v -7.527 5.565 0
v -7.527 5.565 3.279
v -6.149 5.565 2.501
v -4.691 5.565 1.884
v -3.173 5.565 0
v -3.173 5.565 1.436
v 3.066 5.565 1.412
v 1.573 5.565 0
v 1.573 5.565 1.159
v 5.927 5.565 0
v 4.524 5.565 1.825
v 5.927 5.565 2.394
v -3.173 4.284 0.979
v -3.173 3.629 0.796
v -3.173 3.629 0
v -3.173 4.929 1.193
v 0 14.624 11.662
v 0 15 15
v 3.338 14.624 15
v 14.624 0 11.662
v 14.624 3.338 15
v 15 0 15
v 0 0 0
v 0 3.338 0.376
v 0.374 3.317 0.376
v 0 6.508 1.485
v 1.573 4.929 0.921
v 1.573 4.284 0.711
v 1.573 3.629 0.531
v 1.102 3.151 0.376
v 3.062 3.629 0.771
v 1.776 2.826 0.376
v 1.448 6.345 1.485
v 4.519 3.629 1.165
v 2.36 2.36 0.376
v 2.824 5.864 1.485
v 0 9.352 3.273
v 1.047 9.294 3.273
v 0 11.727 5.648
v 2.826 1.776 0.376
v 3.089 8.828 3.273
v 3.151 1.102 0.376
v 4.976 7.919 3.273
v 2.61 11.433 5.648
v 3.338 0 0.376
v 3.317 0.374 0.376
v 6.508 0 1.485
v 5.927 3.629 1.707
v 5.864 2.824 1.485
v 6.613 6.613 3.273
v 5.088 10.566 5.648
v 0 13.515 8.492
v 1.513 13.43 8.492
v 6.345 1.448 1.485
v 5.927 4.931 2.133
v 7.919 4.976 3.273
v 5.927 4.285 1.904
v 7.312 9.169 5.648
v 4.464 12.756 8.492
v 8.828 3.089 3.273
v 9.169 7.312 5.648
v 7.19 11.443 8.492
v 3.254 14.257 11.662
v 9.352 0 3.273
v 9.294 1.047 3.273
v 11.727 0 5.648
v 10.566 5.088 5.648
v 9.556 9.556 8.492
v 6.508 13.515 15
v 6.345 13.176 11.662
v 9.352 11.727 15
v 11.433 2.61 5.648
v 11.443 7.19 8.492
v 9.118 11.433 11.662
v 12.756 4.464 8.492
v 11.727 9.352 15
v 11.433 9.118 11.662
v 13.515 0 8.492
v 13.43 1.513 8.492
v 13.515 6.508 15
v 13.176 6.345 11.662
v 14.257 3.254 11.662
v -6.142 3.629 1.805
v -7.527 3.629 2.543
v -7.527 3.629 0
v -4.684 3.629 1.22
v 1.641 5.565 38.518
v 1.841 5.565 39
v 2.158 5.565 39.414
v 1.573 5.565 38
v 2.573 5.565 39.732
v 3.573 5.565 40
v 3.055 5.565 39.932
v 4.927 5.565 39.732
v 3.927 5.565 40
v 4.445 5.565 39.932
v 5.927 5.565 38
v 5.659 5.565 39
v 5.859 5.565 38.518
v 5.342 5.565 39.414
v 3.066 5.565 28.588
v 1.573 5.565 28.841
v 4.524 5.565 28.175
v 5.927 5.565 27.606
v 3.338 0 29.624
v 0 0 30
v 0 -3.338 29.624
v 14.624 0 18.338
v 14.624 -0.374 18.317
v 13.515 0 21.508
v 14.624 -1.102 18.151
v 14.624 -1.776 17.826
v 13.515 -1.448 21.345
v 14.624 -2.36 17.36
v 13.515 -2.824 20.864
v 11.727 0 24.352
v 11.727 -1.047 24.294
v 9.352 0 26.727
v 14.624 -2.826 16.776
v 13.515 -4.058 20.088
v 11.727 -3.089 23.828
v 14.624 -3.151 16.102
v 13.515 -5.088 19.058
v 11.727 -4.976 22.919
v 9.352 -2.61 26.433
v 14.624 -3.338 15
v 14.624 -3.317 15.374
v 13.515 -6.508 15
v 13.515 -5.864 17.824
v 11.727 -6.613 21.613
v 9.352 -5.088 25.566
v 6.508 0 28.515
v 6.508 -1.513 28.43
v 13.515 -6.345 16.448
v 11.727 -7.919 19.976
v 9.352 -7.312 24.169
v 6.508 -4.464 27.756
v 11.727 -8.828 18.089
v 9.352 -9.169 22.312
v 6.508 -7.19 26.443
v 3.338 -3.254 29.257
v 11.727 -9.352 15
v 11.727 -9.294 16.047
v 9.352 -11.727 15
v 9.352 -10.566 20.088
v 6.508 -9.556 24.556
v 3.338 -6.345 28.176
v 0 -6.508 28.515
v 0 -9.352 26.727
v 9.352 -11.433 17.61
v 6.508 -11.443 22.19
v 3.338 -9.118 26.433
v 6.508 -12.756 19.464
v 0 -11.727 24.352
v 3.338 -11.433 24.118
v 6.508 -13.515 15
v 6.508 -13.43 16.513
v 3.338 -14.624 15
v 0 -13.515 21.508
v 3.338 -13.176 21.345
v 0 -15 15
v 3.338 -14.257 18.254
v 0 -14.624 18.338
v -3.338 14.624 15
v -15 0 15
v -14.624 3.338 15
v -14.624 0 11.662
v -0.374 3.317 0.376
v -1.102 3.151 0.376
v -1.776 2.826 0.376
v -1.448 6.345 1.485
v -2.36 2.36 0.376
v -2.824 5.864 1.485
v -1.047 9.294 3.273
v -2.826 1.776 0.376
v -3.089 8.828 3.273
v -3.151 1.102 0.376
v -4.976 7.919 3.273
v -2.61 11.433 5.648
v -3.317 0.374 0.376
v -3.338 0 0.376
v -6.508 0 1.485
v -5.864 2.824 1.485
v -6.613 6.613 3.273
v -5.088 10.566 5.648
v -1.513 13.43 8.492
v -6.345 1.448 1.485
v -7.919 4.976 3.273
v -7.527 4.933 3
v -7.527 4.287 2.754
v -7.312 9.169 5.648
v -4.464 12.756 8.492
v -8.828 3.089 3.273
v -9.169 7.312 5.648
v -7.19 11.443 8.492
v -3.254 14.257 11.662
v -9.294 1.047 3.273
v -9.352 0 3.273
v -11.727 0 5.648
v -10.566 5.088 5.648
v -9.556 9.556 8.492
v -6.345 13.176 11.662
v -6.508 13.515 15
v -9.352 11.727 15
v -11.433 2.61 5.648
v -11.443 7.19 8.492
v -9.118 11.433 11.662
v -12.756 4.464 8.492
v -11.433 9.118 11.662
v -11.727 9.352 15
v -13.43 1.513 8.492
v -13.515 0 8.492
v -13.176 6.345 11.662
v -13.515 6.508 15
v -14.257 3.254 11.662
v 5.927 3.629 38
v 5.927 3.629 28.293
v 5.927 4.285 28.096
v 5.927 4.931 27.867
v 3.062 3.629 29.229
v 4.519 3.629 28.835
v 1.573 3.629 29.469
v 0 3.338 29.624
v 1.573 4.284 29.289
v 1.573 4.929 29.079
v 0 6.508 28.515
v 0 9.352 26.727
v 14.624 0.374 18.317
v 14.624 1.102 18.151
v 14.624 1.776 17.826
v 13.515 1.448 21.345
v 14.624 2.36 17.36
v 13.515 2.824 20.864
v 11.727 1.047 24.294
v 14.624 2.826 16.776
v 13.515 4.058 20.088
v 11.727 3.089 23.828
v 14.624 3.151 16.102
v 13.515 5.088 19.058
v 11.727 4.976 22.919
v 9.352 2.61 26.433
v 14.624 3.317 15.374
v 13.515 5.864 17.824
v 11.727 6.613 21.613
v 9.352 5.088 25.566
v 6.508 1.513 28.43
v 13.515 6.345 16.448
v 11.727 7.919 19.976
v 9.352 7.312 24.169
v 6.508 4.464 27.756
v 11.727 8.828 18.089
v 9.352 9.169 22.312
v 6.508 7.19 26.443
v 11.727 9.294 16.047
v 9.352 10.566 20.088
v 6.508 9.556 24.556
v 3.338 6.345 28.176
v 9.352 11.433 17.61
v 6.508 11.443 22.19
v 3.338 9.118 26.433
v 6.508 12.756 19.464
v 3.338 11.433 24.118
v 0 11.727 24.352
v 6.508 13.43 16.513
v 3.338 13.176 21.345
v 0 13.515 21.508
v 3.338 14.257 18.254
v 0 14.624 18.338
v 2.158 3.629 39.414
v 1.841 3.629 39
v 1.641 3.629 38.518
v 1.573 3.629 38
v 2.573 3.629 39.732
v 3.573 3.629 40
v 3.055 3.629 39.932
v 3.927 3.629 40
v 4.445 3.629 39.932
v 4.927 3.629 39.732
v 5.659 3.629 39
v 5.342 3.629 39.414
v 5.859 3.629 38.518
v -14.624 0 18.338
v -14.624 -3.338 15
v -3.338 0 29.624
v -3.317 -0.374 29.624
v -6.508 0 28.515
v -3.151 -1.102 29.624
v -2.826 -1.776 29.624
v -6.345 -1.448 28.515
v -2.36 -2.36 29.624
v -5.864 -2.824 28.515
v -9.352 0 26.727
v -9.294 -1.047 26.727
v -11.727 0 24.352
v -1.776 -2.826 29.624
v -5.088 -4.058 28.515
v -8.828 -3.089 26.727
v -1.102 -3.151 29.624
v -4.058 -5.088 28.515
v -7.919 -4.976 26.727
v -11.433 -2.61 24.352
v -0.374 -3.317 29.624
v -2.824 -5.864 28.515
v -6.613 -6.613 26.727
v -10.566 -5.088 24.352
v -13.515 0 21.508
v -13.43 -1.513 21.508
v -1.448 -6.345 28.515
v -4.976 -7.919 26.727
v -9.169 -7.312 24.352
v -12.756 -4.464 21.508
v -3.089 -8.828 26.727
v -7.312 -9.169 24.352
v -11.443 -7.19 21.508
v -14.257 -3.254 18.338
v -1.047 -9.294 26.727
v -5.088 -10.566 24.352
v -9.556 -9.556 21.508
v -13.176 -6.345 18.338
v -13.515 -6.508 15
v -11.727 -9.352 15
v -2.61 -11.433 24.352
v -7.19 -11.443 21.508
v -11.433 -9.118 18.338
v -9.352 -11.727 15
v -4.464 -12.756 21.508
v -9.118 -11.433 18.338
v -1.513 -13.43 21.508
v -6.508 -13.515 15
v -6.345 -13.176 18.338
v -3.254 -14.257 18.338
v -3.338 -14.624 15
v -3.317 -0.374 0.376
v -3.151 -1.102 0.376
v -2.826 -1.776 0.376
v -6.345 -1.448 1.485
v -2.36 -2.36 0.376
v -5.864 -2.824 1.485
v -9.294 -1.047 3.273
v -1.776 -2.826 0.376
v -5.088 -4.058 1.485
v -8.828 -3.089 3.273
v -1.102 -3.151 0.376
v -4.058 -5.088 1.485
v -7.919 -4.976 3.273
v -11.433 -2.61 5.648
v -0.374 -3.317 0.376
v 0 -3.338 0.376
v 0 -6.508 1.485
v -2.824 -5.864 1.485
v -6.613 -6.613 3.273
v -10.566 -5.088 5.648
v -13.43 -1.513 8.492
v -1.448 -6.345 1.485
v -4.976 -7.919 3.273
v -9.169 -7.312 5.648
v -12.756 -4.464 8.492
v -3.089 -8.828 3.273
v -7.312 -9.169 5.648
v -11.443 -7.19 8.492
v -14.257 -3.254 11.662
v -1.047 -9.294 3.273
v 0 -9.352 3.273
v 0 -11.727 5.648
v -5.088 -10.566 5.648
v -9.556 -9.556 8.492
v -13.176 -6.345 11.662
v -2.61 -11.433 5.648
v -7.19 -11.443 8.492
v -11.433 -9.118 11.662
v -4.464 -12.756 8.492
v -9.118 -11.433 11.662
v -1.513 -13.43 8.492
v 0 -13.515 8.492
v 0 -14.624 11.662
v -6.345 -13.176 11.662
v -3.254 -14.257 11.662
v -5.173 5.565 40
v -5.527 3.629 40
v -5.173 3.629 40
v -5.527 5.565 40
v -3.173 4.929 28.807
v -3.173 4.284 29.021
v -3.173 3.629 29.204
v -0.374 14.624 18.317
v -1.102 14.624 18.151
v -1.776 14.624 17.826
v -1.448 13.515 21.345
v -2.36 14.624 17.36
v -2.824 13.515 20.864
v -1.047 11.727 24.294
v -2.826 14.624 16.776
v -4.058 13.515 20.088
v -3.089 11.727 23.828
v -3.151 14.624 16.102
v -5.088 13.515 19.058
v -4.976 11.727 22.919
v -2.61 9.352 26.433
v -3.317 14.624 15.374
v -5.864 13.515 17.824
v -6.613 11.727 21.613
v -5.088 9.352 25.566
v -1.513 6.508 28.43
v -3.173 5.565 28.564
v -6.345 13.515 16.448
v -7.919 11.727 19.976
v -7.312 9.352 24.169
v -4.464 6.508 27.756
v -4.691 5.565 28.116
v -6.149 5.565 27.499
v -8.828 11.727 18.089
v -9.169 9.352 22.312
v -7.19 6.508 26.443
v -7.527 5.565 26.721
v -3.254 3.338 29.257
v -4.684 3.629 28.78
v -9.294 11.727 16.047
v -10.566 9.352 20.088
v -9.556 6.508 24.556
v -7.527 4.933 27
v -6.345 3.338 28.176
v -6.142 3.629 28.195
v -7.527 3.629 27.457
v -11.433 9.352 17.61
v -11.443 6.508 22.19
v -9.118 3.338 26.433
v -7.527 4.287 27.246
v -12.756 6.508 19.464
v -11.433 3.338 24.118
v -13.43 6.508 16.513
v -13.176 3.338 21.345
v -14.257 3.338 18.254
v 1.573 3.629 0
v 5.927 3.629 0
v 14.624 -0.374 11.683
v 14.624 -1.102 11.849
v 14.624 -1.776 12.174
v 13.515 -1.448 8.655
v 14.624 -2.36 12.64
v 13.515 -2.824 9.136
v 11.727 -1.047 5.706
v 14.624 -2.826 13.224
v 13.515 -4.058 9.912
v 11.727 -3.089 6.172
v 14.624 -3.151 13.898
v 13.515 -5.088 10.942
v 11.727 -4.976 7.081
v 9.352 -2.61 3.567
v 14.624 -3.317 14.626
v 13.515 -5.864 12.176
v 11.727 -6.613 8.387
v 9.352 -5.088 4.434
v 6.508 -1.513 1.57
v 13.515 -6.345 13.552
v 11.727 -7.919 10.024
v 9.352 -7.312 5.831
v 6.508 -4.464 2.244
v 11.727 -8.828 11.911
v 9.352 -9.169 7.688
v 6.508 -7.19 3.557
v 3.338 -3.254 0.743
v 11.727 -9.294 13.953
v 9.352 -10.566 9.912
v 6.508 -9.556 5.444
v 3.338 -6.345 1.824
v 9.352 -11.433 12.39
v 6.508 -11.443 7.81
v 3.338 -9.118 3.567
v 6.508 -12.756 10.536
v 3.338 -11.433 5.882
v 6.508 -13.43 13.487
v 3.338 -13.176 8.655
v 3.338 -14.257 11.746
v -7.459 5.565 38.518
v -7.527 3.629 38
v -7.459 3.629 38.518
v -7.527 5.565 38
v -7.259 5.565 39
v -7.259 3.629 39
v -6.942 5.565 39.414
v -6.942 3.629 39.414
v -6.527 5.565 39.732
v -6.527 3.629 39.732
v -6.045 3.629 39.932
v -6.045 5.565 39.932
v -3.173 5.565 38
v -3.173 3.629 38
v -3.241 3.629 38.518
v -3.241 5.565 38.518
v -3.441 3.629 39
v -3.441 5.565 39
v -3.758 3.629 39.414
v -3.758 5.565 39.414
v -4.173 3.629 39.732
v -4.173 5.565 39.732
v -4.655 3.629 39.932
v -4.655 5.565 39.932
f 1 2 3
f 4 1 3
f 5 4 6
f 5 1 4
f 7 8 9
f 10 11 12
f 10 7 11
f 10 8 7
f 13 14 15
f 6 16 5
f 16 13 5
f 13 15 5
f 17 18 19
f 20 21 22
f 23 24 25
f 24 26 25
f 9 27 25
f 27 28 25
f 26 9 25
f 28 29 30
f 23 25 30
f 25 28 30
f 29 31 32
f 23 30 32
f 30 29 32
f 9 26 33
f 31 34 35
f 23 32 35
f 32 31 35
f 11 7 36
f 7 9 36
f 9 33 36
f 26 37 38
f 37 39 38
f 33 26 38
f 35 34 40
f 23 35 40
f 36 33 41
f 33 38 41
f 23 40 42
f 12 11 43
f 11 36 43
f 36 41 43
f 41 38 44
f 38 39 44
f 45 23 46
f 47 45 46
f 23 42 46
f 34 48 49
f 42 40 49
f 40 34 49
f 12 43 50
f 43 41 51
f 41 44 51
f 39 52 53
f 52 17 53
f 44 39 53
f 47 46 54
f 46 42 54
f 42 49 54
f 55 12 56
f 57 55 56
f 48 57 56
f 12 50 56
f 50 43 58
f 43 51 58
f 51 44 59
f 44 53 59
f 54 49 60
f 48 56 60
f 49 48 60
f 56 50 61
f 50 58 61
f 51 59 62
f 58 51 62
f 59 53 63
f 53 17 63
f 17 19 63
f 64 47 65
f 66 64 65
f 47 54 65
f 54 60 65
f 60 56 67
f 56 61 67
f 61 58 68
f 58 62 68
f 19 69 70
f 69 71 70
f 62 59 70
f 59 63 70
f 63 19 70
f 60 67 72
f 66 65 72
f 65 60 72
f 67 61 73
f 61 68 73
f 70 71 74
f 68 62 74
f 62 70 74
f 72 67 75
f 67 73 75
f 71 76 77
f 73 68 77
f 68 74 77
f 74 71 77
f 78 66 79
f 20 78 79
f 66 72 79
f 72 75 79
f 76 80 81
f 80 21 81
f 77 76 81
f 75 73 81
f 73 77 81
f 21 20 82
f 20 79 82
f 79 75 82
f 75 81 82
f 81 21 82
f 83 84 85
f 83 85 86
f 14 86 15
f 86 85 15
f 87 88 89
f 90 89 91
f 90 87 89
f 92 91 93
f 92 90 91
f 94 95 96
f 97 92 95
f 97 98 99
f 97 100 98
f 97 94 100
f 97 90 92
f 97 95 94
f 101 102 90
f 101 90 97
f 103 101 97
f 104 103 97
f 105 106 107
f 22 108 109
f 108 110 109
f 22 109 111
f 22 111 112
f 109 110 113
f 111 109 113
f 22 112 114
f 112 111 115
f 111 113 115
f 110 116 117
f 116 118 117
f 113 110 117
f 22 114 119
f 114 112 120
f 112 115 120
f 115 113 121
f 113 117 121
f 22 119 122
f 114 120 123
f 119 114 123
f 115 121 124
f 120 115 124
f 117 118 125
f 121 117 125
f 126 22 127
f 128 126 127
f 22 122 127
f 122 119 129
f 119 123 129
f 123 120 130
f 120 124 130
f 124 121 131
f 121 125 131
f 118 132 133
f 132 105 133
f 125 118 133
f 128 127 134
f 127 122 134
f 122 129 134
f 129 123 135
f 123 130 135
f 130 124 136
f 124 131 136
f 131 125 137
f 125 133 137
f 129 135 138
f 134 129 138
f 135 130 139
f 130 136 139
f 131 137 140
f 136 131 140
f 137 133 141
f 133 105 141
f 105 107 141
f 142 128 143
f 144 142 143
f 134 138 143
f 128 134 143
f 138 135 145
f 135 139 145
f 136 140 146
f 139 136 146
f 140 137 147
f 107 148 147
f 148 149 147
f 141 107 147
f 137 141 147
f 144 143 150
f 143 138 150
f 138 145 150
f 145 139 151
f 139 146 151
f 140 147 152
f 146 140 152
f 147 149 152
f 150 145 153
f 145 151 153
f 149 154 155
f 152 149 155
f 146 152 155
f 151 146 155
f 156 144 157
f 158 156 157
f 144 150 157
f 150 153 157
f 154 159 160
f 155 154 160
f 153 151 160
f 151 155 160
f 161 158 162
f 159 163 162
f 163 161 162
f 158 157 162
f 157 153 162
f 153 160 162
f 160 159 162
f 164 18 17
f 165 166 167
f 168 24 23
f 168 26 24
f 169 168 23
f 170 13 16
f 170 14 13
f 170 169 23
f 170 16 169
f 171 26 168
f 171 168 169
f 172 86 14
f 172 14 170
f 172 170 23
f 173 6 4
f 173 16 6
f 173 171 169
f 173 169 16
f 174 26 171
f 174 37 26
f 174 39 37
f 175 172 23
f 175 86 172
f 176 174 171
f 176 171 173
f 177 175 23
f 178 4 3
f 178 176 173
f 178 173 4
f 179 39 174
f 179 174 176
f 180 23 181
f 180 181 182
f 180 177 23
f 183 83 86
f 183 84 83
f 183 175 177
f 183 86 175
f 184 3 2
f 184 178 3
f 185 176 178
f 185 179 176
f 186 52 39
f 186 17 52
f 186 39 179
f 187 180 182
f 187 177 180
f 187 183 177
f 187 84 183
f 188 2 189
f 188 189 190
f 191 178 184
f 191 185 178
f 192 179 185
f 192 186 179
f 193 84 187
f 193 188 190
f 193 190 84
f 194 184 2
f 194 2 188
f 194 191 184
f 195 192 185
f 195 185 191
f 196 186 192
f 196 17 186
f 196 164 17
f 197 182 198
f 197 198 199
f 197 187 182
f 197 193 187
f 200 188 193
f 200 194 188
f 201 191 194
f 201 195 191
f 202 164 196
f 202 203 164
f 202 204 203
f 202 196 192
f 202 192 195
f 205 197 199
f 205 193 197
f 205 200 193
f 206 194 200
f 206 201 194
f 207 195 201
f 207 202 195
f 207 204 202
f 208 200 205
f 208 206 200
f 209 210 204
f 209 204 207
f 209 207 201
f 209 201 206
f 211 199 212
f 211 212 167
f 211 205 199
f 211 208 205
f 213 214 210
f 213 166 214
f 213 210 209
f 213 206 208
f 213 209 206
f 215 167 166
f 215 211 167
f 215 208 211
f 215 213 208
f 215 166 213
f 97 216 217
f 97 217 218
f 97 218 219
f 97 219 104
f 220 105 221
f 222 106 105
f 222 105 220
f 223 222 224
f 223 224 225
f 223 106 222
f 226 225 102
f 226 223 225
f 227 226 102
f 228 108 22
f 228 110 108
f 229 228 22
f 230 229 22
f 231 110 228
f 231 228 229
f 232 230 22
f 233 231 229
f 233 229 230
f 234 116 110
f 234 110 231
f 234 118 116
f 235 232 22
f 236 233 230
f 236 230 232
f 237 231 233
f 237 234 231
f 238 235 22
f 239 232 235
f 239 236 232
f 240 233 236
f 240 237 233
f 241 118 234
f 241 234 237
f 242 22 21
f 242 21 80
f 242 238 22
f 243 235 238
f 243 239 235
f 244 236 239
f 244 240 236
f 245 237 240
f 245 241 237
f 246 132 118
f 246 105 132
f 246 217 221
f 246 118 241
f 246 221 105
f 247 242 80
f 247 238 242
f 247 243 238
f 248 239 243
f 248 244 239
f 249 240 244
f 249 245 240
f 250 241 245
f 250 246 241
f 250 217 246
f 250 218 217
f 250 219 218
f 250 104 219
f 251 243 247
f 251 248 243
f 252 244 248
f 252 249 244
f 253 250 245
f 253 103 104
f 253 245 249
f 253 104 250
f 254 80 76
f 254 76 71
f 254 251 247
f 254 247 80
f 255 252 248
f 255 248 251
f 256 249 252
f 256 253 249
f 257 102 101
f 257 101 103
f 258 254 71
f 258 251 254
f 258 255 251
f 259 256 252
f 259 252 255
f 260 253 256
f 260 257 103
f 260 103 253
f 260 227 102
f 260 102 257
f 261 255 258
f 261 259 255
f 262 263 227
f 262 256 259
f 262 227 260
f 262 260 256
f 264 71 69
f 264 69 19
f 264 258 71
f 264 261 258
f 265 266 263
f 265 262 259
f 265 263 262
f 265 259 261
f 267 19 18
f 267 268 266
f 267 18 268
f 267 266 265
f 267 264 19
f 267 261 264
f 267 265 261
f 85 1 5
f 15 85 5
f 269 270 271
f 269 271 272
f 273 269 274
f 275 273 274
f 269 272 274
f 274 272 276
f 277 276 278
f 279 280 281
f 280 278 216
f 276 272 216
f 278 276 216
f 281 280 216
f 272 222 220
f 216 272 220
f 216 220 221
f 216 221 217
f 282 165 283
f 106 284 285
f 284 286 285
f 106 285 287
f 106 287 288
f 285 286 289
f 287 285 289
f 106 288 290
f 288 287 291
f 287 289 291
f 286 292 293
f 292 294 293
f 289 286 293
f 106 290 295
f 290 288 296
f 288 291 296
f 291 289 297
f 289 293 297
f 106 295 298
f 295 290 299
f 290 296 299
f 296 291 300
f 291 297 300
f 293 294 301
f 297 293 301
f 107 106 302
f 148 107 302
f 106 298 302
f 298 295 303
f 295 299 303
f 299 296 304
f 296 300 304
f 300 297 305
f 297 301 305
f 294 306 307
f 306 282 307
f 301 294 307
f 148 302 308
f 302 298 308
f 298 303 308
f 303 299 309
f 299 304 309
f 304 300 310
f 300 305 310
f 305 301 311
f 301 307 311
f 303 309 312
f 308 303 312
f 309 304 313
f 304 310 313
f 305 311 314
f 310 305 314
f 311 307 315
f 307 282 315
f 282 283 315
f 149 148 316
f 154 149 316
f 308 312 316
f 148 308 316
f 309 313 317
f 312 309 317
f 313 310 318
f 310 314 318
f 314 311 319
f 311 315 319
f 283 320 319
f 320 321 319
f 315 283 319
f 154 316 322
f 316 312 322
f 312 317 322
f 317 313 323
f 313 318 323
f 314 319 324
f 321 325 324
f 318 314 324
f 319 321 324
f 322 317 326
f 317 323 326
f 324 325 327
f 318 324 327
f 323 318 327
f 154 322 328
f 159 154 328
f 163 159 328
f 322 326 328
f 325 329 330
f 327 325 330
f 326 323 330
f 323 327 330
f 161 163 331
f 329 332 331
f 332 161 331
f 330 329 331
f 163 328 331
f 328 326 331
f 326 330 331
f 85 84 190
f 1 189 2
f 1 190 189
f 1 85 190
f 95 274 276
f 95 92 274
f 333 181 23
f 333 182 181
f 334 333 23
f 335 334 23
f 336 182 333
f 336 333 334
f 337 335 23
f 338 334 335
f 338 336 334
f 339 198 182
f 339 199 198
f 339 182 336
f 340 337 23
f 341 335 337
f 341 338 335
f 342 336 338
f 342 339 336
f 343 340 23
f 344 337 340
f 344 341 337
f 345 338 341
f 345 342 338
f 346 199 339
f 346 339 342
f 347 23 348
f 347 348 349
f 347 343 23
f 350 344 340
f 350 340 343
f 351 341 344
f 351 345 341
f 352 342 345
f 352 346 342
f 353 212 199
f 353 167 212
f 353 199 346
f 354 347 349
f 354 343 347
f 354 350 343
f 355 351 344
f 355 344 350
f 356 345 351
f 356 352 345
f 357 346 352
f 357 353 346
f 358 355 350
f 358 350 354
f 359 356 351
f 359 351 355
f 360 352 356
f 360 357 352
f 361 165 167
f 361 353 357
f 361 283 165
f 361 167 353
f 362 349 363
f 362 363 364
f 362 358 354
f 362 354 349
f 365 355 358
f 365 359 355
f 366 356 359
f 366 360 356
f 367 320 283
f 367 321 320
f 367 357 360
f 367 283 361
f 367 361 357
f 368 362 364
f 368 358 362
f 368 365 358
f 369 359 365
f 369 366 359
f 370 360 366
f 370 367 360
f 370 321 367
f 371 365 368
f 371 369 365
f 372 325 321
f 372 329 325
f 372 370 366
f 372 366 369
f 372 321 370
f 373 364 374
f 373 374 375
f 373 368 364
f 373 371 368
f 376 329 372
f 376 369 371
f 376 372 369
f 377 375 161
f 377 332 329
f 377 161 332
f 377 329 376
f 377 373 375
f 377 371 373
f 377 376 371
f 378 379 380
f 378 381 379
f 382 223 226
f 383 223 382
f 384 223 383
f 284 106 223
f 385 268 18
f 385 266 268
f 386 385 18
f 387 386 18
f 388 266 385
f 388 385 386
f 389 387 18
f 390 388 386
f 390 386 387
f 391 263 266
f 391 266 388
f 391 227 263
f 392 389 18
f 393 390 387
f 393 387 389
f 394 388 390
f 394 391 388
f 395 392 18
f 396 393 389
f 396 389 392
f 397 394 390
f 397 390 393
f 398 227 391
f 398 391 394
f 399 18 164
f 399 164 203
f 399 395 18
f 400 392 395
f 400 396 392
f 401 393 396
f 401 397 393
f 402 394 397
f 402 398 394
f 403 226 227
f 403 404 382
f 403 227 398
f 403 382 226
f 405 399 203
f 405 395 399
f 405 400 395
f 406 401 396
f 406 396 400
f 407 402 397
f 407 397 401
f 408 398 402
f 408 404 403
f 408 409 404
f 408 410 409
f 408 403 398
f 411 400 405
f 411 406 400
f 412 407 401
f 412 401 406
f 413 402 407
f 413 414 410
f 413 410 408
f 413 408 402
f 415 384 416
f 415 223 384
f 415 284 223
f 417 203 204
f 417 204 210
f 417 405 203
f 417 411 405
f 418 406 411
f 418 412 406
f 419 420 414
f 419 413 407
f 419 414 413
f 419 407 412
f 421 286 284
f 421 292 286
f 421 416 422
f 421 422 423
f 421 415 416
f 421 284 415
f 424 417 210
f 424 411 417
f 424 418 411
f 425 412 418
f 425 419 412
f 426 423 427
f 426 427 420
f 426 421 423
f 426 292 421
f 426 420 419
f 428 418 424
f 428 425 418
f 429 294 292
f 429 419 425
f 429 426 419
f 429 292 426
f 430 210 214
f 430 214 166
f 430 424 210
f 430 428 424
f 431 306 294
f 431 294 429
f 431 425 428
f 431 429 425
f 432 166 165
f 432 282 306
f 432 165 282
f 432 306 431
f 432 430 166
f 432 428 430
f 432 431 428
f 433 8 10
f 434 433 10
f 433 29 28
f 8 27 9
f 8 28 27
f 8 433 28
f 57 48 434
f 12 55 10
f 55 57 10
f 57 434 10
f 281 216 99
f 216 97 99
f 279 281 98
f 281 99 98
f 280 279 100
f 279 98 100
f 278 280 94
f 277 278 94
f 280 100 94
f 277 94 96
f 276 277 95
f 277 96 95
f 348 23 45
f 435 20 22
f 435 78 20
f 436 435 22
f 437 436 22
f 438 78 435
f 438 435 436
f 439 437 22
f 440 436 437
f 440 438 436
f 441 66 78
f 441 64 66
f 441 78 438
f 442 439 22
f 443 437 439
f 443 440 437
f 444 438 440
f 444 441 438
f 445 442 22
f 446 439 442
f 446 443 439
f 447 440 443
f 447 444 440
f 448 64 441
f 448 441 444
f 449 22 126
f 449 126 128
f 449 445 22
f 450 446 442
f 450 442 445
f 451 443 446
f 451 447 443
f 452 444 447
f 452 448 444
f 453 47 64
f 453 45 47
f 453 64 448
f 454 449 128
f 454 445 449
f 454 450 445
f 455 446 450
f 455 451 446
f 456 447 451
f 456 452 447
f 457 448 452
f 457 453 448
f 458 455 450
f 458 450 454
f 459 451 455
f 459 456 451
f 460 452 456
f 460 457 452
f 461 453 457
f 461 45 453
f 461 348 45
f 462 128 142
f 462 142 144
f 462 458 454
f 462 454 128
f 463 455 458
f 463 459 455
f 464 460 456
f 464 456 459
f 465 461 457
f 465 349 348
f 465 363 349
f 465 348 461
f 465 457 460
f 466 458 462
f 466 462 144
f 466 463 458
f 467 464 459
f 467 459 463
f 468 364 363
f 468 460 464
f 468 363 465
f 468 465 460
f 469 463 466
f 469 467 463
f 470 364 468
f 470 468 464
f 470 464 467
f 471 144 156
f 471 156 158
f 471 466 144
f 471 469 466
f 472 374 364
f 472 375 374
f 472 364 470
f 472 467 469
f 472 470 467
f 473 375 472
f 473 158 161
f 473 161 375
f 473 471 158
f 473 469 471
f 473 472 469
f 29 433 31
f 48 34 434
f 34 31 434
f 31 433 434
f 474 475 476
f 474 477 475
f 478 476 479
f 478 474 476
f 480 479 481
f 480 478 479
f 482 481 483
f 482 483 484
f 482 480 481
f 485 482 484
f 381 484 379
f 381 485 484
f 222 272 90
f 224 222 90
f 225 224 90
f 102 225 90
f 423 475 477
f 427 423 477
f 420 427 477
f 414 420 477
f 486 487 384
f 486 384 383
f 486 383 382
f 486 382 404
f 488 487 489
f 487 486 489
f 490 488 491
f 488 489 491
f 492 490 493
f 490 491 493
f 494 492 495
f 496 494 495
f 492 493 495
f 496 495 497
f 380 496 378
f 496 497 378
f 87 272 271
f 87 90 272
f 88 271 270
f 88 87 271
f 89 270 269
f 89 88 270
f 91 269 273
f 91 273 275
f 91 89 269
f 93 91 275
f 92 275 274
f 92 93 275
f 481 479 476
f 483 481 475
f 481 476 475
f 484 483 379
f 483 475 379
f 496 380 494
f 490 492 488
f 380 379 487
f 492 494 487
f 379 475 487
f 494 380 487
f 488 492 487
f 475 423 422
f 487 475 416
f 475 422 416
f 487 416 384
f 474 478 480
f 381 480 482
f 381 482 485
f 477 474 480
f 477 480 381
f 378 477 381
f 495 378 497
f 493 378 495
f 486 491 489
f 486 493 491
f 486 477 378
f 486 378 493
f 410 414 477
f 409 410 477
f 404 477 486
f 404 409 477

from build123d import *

# Parameters (mm, degrees)
F0_W     = 30
F0_H     = 30
F1_DEPTH = 30
F2_R     = 14.99999
F3_W     = 4.3548396789
F3_H     = 1.9354838878
F4_DEPTH = 40
F5_R     = 2


# Not quite as in the source:
# - a fillet or chamfer is up to 0.001 mm smaller than in the source, because OpenCascade refuses the exact size
# - the program builds the solid bodies; features that only make, move or delete a surface that nothing else refers to are left out


with BuildPart() as f1:
    # F0 (on Top) → F1 (new body)
    with BuildSketch(Plane.XY):
        Rectangle(F0_W, F0_H)
    extrude(amount=F1_DEPTH)

    # F2 (radius 15 in the source; OpenCascade refuses exactly that, so slightly less here)
    f2_edges = [f1.edges().sort_by_distance(p)[0] for p in [
        (-15, -15, 15),
        (-15, 0, 30),
        (0, -15, 30),
        (0, 15, 30),
        (15, 0, 30),
        (15, 15, 15),
        (-15, 15, 15),
        (0, 15, 0),
        (-15, 0, 0),
        (0, -15, 0),
        (15, 0, 0),
        (15, -15, 15),
    ]]
    fillet(f2_edges, radius=F2_R)

    # F3 (on Top) → F4 (join)
    with BuildSketch(Plane.XY):
        with Locations((3.7499994505, 4.5967744663)):
            Rectangle(F3_W, F3_H)
        with Locations((-5.3500005495, 4.5967744663)):
            Rectangle(F3_W, F3_H)
    extrude(amount=F4_DEPTH)

    # F5
    f5_edges = [f1.edges().sort_by_distance(p)[0] for p in [
        (5.927419, 4.596774, 40),
        (-3.172581, 4.596774, 40),
        (1.57258, 4.596774, 40),
        (-7.52742, 4.596774, 40),
    ]]
    fillet(f5_edges, radius=F5_R)


solid = f1.part
